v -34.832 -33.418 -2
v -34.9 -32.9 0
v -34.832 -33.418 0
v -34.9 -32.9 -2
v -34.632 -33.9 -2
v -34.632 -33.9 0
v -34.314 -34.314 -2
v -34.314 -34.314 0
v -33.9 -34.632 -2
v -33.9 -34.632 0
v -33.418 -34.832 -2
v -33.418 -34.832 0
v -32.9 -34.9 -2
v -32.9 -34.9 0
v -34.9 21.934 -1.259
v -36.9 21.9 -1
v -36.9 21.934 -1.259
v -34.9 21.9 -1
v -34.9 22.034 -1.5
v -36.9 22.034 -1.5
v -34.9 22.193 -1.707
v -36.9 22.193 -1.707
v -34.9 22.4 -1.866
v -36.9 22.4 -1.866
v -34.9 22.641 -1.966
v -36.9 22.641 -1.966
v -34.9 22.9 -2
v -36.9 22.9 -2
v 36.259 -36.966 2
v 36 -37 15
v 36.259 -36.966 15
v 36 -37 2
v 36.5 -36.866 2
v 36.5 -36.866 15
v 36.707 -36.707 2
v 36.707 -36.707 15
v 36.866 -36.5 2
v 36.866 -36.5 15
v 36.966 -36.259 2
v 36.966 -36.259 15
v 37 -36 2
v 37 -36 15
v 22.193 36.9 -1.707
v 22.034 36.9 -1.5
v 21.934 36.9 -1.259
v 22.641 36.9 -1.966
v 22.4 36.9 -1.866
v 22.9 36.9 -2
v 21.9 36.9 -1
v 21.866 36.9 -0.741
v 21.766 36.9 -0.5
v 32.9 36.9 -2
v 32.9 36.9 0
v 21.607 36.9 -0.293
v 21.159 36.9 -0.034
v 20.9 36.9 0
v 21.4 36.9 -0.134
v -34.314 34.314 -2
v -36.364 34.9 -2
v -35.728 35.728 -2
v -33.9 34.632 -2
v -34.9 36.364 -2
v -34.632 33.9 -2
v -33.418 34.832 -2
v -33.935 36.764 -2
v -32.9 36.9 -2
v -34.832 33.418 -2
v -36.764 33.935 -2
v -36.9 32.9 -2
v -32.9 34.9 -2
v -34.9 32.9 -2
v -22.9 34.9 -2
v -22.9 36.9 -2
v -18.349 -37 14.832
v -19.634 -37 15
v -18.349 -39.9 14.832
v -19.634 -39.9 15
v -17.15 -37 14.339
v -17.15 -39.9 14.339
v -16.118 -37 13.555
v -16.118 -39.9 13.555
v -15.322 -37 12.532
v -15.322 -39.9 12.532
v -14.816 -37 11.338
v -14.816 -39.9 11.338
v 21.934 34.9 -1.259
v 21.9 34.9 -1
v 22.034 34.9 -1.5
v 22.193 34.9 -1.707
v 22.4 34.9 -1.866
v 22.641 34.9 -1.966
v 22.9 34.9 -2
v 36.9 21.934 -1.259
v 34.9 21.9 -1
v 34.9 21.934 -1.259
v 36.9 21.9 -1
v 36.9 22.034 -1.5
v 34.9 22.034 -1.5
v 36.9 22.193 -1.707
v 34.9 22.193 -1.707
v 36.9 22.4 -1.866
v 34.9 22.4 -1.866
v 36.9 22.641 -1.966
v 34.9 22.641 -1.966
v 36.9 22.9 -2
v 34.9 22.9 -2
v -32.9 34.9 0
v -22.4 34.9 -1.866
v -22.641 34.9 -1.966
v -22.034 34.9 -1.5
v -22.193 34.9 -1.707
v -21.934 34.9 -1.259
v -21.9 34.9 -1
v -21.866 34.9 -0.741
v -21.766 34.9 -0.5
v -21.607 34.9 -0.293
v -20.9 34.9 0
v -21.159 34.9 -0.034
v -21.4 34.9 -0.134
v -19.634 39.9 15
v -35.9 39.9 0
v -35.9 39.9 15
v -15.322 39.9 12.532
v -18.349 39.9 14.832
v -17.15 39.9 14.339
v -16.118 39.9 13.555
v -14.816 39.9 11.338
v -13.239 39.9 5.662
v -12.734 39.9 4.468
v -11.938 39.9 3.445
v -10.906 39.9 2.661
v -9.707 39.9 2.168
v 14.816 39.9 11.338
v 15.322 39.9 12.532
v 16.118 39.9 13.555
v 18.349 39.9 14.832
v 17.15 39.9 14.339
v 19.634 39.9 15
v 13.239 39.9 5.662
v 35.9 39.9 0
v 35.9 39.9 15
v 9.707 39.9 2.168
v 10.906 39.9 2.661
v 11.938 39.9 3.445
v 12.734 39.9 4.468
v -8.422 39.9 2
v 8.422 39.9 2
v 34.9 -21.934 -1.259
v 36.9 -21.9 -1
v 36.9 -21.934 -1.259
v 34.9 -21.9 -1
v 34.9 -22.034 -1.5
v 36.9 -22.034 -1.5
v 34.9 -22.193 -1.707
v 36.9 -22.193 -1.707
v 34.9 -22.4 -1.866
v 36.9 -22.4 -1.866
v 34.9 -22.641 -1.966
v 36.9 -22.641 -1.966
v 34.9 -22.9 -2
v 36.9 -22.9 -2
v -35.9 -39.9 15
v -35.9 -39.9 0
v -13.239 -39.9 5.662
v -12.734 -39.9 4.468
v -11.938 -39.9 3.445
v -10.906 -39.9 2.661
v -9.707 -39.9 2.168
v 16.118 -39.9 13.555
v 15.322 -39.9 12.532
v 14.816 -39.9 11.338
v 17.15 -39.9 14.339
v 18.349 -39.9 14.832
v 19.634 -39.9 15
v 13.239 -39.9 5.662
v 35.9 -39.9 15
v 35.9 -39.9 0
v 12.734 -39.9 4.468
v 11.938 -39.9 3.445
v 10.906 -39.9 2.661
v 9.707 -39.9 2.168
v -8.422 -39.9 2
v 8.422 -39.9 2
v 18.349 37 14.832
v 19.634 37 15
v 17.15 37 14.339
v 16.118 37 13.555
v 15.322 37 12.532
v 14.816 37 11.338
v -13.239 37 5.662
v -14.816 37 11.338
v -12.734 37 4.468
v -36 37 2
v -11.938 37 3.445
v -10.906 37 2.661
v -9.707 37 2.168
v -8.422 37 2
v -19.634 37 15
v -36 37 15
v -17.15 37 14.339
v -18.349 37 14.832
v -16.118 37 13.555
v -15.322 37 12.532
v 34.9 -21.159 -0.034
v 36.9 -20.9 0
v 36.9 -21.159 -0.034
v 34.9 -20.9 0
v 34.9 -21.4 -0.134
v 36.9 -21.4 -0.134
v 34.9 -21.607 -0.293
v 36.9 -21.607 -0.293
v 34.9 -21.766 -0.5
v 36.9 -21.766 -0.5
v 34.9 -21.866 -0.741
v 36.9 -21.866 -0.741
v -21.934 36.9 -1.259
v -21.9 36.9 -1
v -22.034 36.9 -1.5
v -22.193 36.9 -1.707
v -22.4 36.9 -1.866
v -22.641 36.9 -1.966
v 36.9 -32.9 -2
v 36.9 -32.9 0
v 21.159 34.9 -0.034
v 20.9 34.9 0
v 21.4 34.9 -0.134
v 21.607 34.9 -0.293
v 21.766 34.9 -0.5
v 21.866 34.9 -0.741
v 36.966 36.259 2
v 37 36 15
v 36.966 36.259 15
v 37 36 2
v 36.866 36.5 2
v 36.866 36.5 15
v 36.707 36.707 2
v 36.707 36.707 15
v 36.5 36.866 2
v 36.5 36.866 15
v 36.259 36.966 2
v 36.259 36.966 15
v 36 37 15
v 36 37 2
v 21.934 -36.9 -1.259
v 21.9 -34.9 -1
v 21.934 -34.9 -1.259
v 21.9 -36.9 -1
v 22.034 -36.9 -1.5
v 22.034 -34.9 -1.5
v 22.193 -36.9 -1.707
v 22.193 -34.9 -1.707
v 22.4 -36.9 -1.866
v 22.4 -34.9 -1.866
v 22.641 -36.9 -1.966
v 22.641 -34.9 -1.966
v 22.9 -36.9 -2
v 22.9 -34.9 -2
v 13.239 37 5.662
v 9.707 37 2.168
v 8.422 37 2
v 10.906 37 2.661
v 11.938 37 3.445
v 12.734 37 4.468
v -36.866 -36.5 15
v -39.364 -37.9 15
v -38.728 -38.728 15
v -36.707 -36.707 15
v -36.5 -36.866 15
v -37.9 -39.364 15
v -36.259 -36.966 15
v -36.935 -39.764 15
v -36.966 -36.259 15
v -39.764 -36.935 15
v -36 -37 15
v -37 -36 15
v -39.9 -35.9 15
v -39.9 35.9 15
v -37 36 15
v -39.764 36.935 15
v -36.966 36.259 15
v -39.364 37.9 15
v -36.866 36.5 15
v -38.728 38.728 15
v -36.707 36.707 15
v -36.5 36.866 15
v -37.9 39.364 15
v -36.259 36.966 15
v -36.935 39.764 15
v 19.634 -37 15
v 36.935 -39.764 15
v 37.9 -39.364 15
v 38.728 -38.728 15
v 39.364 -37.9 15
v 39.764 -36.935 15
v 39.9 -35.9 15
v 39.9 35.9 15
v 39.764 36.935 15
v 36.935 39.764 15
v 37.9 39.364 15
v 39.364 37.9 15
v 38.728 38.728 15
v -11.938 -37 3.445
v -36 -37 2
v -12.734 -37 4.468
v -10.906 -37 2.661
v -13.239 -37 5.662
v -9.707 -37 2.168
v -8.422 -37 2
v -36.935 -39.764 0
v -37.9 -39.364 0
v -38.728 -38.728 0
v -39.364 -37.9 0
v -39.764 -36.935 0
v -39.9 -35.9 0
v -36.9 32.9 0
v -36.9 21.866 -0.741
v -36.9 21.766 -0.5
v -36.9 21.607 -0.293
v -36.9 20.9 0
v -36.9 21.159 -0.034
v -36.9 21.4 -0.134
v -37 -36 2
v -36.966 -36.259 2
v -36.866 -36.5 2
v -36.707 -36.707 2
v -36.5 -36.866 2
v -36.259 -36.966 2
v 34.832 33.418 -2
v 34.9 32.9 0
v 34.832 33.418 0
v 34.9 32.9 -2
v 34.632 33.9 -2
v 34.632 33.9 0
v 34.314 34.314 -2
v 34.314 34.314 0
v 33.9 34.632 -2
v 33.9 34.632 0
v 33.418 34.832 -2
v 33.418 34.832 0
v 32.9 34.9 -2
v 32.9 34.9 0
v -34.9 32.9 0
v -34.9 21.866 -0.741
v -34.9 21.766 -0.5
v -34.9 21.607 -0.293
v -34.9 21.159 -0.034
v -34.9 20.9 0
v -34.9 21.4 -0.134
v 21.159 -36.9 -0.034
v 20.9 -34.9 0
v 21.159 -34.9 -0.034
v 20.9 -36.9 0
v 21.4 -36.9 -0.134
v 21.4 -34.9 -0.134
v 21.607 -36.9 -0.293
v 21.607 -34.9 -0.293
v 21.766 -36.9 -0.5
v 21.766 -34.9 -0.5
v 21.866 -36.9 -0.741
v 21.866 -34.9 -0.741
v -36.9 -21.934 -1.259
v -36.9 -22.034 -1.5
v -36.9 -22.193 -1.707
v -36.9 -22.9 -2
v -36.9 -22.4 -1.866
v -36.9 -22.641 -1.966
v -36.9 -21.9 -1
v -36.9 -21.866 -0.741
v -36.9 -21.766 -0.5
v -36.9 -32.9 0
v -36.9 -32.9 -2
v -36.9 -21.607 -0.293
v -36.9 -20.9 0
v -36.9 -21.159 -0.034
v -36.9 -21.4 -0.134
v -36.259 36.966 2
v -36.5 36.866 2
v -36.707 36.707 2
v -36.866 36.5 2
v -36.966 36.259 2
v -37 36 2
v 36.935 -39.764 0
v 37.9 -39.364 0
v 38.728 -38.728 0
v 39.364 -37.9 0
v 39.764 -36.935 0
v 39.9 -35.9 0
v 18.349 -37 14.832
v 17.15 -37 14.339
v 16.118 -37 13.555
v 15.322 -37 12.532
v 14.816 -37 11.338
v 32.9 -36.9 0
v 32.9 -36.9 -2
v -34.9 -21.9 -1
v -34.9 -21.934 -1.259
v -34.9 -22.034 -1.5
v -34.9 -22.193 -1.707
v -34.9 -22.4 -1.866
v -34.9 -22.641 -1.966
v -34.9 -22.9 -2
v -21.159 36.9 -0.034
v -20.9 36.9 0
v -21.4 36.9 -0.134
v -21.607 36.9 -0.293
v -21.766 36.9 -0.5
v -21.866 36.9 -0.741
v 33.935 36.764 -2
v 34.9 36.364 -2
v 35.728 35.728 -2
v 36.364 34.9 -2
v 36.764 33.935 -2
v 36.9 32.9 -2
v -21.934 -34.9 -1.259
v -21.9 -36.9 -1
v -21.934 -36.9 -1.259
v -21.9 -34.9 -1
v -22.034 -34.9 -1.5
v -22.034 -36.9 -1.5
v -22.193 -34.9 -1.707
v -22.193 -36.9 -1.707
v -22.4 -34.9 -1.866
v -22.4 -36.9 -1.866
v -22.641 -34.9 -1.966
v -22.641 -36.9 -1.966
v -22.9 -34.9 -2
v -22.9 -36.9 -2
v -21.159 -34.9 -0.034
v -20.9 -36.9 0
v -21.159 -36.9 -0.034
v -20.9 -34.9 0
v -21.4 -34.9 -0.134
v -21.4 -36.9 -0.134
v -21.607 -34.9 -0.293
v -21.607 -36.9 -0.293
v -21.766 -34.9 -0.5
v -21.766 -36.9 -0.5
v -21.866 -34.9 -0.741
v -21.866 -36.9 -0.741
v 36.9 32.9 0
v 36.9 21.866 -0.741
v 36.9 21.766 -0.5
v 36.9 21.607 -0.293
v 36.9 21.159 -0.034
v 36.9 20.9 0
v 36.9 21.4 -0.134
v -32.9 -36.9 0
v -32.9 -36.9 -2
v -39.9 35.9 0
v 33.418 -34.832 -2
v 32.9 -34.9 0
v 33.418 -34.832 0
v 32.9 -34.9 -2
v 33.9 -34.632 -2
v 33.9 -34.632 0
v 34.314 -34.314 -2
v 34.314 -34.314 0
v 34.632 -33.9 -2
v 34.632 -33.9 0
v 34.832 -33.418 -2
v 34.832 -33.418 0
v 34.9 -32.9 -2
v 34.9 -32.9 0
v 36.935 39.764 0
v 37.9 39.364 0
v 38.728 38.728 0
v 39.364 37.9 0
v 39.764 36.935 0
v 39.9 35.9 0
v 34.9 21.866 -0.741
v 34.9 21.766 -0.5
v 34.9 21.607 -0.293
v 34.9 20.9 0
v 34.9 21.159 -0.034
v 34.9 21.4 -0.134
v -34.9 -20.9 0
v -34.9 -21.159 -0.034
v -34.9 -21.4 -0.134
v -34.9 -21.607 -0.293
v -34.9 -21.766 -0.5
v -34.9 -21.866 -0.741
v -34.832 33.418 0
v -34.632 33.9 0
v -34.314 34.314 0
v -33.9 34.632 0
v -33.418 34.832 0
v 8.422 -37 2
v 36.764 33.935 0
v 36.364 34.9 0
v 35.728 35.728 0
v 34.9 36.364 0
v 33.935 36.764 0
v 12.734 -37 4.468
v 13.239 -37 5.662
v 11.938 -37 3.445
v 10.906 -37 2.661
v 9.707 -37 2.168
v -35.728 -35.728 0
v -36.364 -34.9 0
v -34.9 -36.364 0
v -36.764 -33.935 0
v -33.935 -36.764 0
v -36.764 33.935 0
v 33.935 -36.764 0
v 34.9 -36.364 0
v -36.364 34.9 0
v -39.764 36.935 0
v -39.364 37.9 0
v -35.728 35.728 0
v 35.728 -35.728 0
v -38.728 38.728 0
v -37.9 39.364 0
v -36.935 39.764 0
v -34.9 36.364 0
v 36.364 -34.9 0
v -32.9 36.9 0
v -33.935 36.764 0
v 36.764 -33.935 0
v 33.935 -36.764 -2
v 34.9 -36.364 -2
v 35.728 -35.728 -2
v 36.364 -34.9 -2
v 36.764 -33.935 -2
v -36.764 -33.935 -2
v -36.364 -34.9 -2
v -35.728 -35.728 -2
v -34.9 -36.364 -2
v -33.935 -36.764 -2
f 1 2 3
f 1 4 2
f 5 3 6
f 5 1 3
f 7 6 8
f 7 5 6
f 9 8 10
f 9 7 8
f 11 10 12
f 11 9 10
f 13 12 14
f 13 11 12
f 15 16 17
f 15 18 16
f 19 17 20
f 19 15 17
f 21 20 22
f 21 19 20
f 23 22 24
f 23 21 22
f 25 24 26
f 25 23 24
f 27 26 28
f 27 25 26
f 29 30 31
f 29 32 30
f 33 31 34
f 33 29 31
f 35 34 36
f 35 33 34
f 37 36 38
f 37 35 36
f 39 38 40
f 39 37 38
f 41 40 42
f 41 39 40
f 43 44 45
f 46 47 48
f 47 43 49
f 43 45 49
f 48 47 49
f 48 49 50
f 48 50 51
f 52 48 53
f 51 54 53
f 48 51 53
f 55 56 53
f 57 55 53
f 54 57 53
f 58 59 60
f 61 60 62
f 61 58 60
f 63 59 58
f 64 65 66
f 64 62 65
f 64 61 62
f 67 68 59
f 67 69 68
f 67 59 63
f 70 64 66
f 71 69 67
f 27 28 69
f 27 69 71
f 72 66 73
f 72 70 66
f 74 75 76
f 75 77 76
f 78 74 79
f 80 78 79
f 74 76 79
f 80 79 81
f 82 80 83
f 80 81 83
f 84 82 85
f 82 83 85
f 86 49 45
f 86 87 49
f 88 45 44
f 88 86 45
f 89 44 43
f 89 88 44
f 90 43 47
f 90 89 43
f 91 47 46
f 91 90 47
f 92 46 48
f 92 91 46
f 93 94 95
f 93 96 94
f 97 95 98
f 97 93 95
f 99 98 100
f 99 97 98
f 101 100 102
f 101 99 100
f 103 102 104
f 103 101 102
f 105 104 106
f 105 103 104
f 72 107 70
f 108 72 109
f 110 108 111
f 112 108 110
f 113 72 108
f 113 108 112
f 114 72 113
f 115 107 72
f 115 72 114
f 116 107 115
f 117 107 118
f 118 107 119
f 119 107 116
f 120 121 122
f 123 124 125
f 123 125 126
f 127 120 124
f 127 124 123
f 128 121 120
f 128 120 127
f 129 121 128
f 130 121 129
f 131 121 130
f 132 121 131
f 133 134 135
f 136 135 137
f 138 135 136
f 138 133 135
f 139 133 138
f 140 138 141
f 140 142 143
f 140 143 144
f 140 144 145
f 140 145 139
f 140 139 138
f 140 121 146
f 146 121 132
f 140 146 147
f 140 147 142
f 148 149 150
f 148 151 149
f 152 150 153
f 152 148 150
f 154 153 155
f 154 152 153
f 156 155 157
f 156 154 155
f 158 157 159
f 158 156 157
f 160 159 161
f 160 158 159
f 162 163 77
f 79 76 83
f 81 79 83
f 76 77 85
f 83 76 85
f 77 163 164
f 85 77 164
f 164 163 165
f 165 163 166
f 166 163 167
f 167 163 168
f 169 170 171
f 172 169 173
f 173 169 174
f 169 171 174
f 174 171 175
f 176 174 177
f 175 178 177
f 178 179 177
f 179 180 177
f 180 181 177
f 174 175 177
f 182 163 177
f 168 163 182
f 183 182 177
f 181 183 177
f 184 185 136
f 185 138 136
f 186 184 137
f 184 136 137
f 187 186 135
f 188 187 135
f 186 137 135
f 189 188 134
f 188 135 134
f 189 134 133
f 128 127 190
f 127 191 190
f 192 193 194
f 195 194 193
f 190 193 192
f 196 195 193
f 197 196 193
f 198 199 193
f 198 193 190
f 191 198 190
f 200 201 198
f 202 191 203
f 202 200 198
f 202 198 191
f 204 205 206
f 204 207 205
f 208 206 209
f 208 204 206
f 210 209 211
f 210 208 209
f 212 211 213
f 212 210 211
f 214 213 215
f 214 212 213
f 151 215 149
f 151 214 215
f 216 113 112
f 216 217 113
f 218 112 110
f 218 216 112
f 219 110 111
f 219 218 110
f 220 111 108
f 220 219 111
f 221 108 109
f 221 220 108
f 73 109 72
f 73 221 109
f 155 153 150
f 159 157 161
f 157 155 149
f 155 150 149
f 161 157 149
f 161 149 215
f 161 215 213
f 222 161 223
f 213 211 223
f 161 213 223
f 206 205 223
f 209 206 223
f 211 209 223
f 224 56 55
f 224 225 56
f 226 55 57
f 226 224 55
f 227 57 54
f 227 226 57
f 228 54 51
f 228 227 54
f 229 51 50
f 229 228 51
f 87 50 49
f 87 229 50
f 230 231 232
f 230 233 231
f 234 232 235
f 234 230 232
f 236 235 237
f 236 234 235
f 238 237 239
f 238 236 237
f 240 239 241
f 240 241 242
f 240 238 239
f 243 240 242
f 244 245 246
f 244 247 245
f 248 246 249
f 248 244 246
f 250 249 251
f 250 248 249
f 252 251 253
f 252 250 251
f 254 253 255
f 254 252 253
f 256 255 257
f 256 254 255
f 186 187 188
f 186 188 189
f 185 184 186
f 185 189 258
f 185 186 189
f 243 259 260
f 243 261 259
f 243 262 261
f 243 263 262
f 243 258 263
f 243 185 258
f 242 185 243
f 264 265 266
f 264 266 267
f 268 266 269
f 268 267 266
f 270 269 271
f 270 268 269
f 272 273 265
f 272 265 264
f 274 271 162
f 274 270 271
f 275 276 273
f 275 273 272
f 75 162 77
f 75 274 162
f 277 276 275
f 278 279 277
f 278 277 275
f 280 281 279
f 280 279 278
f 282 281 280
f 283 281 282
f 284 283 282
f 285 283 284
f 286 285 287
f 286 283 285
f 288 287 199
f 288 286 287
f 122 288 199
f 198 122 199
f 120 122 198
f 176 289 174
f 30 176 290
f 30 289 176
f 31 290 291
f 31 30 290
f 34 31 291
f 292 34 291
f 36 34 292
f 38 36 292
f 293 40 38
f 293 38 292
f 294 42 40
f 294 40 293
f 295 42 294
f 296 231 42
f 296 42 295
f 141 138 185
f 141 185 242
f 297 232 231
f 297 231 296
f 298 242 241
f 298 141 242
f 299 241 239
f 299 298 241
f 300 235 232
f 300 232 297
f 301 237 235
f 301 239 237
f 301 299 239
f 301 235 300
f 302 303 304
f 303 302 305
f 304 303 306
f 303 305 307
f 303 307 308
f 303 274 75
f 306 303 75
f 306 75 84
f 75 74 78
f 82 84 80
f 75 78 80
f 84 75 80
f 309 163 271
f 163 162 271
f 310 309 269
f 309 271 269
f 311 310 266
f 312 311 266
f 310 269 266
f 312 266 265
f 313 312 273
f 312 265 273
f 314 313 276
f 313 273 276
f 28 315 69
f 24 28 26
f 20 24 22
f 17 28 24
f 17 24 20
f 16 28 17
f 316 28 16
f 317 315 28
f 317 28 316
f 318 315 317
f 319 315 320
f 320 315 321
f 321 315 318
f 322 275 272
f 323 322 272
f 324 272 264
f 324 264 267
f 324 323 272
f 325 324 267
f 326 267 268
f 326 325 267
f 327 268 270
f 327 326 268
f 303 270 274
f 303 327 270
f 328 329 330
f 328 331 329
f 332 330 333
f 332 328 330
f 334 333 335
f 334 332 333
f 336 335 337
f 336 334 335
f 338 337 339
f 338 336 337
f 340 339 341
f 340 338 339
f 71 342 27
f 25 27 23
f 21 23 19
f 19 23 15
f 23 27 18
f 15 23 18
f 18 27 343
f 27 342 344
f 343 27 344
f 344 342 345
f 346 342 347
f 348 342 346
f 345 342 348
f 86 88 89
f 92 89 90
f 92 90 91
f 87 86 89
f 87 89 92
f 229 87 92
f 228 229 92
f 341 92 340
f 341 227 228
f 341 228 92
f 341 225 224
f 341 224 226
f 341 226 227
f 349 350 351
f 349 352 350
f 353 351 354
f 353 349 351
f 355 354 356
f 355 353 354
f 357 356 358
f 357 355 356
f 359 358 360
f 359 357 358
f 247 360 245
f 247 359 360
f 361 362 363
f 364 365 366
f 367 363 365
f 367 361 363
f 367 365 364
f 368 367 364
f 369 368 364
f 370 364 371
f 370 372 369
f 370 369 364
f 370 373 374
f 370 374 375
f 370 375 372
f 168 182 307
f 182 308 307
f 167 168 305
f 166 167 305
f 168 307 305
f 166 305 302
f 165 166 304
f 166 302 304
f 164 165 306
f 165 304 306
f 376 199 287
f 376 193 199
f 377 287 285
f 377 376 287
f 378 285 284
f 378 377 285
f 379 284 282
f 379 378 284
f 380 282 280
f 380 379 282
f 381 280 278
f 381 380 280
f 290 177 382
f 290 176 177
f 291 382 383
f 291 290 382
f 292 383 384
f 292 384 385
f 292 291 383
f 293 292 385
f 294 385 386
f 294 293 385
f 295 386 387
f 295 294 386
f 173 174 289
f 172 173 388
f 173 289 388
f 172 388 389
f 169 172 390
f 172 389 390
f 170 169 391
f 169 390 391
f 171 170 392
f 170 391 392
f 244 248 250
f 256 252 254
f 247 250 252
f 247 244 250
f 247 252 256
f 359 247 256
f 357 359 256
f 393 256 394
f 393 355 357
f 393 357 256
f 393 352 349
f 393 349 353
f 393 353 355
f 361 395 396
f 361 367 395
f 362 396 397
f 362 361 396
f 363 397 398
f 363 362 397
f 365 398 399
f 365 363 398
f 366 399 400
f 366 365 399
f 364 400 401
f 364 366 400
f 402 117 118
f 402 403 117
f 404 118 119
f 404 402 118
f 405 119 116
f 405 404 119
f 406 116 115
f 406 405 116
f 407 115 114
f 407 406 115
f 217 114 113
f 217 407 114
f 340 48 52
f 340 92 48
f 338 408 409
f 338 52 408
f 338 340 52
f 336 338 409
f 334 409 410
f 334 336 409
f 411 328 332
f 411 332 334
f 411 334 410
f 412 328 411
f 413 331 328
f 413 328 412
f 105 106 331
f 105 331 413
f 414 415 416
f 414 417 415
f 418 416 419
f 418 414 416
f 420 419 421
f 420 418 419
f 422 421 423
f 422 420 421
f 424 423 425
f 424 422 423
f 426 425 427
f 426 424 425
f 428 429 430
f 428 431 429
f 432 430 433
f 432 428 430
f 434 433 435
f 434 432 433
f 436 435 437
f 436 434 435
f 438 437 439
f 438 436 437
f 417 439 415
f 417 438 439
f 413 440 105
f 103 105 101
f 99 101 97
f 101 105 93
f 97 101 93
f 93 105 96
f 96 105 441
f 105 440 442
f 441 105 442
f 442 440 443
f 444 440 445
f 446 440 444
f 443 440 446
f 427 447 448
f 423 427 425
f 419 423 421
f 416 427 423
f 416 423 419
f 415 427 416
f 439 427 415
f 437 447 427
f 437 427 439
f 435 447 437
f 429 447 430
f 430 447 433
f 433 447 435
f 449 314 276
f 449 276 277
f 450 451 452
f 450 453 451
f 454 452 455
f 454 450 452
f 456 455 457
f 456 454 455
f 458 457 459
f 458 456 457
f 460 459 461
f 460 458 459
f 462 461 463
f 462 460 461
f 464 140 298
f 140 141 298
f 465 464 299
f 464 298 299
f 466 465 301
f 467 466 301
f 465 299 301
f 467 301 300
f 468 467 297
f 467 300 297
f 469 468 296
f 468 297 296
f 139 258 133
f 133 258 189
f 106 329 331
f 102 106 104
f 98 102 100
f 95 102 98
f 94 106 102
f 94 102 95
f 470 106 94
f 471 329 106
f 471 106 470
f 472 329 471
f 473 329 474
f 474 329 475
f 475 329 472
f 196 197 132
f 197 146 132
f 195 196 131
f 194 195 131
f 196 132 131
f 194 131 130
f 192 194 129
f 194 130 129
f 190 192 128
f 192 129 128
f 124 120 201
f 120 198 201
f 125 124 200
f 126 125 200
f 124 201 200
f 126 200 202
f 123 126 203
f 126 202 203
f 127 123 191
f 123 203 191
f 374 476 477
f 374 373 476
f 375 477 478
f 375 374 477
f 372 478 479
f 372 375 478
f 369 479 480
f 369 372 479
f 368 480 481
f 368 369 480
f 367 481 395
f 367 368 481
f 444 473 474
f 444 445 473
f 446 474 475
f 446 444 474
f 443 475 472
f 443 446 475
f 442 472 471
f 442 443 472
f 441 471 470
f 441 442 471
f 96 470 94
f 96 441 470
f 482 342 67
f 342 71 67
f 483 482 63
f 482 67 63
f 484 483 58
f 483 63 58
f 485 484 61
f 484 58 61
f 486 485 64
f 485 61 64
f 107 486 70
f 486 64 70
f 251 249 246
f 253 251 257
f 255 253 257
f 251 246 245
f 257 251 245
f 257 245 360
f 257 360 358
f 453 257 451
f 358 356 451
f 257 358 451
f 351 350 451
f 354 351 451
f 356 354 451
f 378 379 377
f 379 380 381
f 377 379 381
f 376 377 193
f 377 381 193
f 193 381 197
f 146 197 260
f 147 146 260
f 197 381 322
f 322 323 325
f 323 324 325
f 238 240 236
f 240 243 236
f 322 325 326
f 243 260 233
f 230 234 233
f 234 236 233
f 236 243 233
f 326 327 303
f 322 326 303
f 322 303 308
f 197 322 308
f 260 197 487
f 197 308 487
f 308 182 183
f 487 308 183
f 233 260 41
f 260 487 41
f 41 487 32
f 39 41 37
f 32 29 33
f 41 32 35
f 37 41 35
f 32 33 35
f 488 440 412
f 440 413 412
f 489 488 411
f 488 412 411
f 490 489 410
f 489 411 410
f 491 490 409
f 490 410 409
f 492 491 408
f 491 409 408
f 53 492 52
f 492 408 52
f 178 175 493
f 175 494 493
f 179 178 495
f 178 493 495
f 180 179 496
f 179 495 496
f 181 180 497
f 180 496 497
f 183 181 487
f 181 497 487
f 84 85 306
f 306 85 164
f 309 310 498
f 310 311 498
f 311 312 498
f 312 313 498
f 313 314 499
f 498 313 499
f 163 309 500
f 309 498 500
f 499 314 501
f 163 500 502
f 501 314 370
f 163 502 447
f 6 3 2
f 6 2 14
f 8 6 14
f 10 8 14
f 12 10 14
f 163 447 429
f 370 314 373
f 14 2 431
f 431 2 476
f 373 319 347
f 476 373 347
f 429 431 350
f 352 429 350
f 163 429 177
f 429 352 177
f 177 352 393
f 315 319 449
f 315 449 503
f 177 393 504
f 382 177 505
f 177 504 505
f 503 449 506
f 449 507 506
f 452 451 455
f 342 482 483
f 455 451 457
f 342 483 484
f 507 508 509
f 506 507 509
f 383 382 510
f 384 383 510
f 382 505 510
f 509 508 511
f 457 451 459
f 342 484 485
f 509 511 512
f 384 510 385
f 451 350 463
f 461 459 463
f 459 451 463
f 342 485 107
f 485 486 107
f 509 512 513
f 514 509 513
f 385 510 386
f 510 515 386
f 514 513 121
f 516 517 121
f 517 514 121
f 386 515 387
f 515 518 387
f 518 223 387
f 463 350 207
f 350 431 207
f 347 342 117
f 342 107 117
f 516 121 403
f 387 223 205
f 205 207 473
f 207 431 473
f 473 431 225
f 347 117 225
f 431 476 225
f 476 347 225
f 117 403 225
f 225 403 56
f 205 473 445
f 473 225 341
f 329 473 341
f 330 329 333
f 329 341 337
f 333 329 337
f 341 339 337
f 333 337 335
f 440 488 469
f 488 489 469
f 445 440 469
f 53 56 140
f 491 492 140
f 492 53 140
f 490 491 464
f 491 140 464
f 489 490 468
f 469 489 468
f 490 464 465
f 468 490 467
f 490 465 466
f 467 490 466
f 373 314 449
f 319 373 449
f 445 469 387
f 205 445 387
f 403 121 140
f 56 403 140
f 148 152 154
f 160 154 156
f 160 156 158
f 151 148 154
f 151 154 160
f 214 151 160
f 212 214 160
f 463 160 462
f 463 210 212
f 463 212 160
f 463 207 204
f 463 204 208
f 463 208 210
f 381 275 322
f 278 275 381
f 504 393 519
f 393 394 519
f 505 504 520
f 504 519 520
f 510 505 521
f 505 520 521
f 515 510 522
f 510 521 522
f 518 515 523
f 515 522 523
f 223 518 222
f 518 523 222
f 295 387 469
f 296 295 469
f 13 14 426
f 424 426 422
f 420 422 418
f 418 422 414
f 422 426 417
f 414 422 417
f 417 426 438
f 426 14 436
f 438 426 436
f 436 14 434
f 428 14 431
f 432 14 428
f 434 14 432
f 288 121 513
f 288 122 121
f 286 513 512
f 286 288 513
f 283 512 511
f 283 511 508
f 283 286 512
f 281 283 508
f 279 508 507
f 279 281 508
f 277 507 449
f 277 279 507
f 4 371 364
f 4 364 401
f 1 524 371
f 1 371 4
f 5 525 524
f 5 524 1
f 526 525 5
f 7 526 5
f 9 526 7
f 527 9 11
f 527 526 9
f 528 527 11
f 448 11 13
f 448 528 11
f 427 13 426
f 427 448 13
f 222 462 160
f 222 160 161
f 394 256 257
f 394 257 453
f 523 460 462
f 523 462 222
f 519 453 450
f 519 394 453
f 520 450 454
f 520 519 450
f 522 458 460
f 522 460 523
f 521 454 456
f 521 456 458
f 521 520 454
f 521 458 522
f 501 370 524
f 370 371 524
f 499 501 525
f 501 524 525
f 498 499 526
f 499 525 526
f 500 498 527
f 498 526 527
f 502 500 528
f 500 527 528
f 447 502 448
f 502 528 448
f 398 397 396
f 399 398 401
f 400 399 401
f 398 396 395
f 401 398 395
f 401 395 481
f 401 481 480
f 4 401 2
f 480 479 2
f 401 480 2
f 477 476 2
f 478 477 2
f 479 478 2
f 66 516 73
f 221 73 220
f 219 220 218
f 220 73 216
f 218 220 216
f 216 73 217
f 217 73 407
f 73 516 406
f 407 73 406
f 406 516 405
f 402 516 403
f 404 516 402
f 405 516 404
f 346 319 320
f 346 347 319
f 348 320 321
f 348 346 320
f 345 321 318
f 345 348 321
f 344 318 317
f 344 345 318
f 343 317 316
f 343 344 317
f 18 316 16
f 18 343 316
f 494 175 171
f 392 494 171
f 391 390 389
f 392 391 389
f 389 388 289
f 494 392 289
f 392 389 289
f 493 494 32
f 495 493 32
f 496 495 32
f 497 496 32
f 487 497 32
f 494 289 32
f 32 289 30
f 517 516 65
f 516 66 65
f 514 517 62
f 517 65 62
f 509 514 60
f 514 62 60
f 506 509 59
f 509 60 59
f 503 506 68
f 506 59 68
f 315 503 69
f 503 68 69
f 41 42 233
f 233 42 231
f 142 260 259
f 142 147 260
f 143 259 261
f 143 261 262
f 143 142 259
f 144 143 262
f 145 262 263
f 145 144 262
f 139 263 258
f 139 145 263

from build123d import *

# Parameters (mm, degrees)
F0_W      = 79.8
F0_H      = 79.8
F1_DEPTH  = 15
F2_W      = 74
F2_H      = 74
F3_DEPTH  = 13
F4_W      = 73.8
F4_H      = 73.8
F4_W_2    = 69.8
F4_H_2    = 69.8
F5_DEPTH  = 2
F7_DEPTH  = 2
F8_R      = 2
F9_R      = 4
F10_R     = 0.99999
F12_DEPTH = 79.801
F13_R     = 5
F14_R     = 4
F15_R     = 1


# Not quite as in the source:
# - a fillet or chamfer is up to 0.001 mm smaller than in the source, because OpenCascade refuses the exact size


with BuildPart() as f1:
    # F0 (on Top) → F1 (new body)
    with BuildSketch(Plane.XY):
        Rectangle(F0_W, F0_H)
    extrude(amount=F1_DEPTH)

    # F2 (on face) → F3 (cut)
    with BuildSketch(Plane.XY.offset(15)):
        Rectangle(F2_W, F2_H)
    extrude(amount=-F3_DEPTH, mode=Mode.SUBTRACT)

    # F4 (on face) → F5 (join)
    with BuildSketch(Plane(origin=(0, 0, 0), x_dir=(1, 0, 0), z_dir=(0, 0, -1))):
        Rectangle(F4_W, F4_H)
        Rectangle(F4_W_2, F4_H_2, mode=Mode.SUBTRACT)
    extrude(amount=F5_DEPTH)

    # F6 (on face) → F7 (cut, through all)
    with BuildSketch(Plane(origin=(0, 0, -2), x_dir=(1, 0, 0), z_dir=(0, 0, -1))):
        Polygon((36.9, -21.9), (36.9, 21.9), (21.9, 21.9), (21.9, 36.9), (-21.9, 36.9), (-21.9, 21.9), (-36.9, 21.9), (-36.9, -21.9), (-21.9, -21.9), (-21.9, -36.9), (21.9, -36.9), (21.9, -21.9), align=None)
    extrude(amount=-F7_DEPTH, mode=Mode.SUBTRACT)

    # F8
    f8_edges = [f1.edges().sort_by_distance(p)[0] for p in [
        (-34.9, 34.9, -1),
        (-34.9, -34.9, -1),
        (34.9, -34.9, -1),
        (34.9, 34.9, -1),
    ]]
    fillet(f8_edges, radius=F8_R)

    # F9
    f9_edges = [f1.edges().sort_by_distance(p)[0] for p in [
        (-36.9, 36.9, -1),
        (36.9, 36.9, -1),
        (36.9, -36.9, -1),
        (-36.9, -36.9, -1),
    ]]
    fillet(f9_edges, radius=F9_R)

    # F10 (radius 1 in the source; OpenCascade refuses exactly that, so slightly less here)
    f10_edges = [f1.edges().sort_by_distance(p)[0] for p in [
        (21.9, -35.9, -2),
        (21.9, -35.9, 0),
        (35.9, -21.9, -2),
        (35.9, -21.9, 0),
        (-35.9, -21.9, -2),
        (-35.9, -21.9, 0),
        (-21.9, -35.9, -2),
        (-21.9, -35.9, 0),
        (-35.9, 21.9, -2),
        (-35.9, 21.9, 0),
        (-21.9, 35.9, -2),
        (-21.9, 35.9, 0),
        (21.9, 35.9, -2),
        (21.9, 35.9, 0),
        (35.9, 21.9, -2),
        (35.9, 21.9, 0),
    ]]
    fillet(f10_edges, radius=F10_R)

    # F11 (on face) → F12 (cut, through all)
    with BuildSketch(Plane.XZ.offset(39.9)):
        Polygon((20, 30), (-20, 30), (-12.2222222222, 2), (12.2222222222, 2), align=None)
    extrude(amount=-F12_DEPTH, mode=Mode.SUBTRACT)

    # F13
    f13_edges = [f1.edges().sort_by_distance(p)[0] for p in [
        (-15.833333, 38.45, 15),
        (-15.833333, -38.45, 15),
        (15.833333, -38.45, 15),
        (15.833333, 38.45, 15),
        (-12.222222, 38.45, 2),
        (-12.222222, -38.45, 2),
        (12.222222, -38.45, 2),
        (12.222222, 38.45, 2),
    ]]
    fillet(f13_edges, radius=F13_R)

    # F14
    f14_edges = [f1.edges().sort_by_distance(p)[0] for p in [
        (39.9, -39.9, 7.5),
        (39.9, 39.9, 7.5),
        (-39.9, -39.9, 7.5),
        (-39.9, 39.9, 7.5),
    ]]
    fillet(f14_edges, radius=F14_R)

    # F15
    f15_edges = [f1.edges().sort_by_distance(p)[0] for p in [
        (37, 37, 8.5),
        (-37, 37, 8.5),
        (-37, -37, 8.5),
        (37, -37, 8.5),
    ]]
    fillet(f15_edges, radius=F15_R)


solid = f1.part
